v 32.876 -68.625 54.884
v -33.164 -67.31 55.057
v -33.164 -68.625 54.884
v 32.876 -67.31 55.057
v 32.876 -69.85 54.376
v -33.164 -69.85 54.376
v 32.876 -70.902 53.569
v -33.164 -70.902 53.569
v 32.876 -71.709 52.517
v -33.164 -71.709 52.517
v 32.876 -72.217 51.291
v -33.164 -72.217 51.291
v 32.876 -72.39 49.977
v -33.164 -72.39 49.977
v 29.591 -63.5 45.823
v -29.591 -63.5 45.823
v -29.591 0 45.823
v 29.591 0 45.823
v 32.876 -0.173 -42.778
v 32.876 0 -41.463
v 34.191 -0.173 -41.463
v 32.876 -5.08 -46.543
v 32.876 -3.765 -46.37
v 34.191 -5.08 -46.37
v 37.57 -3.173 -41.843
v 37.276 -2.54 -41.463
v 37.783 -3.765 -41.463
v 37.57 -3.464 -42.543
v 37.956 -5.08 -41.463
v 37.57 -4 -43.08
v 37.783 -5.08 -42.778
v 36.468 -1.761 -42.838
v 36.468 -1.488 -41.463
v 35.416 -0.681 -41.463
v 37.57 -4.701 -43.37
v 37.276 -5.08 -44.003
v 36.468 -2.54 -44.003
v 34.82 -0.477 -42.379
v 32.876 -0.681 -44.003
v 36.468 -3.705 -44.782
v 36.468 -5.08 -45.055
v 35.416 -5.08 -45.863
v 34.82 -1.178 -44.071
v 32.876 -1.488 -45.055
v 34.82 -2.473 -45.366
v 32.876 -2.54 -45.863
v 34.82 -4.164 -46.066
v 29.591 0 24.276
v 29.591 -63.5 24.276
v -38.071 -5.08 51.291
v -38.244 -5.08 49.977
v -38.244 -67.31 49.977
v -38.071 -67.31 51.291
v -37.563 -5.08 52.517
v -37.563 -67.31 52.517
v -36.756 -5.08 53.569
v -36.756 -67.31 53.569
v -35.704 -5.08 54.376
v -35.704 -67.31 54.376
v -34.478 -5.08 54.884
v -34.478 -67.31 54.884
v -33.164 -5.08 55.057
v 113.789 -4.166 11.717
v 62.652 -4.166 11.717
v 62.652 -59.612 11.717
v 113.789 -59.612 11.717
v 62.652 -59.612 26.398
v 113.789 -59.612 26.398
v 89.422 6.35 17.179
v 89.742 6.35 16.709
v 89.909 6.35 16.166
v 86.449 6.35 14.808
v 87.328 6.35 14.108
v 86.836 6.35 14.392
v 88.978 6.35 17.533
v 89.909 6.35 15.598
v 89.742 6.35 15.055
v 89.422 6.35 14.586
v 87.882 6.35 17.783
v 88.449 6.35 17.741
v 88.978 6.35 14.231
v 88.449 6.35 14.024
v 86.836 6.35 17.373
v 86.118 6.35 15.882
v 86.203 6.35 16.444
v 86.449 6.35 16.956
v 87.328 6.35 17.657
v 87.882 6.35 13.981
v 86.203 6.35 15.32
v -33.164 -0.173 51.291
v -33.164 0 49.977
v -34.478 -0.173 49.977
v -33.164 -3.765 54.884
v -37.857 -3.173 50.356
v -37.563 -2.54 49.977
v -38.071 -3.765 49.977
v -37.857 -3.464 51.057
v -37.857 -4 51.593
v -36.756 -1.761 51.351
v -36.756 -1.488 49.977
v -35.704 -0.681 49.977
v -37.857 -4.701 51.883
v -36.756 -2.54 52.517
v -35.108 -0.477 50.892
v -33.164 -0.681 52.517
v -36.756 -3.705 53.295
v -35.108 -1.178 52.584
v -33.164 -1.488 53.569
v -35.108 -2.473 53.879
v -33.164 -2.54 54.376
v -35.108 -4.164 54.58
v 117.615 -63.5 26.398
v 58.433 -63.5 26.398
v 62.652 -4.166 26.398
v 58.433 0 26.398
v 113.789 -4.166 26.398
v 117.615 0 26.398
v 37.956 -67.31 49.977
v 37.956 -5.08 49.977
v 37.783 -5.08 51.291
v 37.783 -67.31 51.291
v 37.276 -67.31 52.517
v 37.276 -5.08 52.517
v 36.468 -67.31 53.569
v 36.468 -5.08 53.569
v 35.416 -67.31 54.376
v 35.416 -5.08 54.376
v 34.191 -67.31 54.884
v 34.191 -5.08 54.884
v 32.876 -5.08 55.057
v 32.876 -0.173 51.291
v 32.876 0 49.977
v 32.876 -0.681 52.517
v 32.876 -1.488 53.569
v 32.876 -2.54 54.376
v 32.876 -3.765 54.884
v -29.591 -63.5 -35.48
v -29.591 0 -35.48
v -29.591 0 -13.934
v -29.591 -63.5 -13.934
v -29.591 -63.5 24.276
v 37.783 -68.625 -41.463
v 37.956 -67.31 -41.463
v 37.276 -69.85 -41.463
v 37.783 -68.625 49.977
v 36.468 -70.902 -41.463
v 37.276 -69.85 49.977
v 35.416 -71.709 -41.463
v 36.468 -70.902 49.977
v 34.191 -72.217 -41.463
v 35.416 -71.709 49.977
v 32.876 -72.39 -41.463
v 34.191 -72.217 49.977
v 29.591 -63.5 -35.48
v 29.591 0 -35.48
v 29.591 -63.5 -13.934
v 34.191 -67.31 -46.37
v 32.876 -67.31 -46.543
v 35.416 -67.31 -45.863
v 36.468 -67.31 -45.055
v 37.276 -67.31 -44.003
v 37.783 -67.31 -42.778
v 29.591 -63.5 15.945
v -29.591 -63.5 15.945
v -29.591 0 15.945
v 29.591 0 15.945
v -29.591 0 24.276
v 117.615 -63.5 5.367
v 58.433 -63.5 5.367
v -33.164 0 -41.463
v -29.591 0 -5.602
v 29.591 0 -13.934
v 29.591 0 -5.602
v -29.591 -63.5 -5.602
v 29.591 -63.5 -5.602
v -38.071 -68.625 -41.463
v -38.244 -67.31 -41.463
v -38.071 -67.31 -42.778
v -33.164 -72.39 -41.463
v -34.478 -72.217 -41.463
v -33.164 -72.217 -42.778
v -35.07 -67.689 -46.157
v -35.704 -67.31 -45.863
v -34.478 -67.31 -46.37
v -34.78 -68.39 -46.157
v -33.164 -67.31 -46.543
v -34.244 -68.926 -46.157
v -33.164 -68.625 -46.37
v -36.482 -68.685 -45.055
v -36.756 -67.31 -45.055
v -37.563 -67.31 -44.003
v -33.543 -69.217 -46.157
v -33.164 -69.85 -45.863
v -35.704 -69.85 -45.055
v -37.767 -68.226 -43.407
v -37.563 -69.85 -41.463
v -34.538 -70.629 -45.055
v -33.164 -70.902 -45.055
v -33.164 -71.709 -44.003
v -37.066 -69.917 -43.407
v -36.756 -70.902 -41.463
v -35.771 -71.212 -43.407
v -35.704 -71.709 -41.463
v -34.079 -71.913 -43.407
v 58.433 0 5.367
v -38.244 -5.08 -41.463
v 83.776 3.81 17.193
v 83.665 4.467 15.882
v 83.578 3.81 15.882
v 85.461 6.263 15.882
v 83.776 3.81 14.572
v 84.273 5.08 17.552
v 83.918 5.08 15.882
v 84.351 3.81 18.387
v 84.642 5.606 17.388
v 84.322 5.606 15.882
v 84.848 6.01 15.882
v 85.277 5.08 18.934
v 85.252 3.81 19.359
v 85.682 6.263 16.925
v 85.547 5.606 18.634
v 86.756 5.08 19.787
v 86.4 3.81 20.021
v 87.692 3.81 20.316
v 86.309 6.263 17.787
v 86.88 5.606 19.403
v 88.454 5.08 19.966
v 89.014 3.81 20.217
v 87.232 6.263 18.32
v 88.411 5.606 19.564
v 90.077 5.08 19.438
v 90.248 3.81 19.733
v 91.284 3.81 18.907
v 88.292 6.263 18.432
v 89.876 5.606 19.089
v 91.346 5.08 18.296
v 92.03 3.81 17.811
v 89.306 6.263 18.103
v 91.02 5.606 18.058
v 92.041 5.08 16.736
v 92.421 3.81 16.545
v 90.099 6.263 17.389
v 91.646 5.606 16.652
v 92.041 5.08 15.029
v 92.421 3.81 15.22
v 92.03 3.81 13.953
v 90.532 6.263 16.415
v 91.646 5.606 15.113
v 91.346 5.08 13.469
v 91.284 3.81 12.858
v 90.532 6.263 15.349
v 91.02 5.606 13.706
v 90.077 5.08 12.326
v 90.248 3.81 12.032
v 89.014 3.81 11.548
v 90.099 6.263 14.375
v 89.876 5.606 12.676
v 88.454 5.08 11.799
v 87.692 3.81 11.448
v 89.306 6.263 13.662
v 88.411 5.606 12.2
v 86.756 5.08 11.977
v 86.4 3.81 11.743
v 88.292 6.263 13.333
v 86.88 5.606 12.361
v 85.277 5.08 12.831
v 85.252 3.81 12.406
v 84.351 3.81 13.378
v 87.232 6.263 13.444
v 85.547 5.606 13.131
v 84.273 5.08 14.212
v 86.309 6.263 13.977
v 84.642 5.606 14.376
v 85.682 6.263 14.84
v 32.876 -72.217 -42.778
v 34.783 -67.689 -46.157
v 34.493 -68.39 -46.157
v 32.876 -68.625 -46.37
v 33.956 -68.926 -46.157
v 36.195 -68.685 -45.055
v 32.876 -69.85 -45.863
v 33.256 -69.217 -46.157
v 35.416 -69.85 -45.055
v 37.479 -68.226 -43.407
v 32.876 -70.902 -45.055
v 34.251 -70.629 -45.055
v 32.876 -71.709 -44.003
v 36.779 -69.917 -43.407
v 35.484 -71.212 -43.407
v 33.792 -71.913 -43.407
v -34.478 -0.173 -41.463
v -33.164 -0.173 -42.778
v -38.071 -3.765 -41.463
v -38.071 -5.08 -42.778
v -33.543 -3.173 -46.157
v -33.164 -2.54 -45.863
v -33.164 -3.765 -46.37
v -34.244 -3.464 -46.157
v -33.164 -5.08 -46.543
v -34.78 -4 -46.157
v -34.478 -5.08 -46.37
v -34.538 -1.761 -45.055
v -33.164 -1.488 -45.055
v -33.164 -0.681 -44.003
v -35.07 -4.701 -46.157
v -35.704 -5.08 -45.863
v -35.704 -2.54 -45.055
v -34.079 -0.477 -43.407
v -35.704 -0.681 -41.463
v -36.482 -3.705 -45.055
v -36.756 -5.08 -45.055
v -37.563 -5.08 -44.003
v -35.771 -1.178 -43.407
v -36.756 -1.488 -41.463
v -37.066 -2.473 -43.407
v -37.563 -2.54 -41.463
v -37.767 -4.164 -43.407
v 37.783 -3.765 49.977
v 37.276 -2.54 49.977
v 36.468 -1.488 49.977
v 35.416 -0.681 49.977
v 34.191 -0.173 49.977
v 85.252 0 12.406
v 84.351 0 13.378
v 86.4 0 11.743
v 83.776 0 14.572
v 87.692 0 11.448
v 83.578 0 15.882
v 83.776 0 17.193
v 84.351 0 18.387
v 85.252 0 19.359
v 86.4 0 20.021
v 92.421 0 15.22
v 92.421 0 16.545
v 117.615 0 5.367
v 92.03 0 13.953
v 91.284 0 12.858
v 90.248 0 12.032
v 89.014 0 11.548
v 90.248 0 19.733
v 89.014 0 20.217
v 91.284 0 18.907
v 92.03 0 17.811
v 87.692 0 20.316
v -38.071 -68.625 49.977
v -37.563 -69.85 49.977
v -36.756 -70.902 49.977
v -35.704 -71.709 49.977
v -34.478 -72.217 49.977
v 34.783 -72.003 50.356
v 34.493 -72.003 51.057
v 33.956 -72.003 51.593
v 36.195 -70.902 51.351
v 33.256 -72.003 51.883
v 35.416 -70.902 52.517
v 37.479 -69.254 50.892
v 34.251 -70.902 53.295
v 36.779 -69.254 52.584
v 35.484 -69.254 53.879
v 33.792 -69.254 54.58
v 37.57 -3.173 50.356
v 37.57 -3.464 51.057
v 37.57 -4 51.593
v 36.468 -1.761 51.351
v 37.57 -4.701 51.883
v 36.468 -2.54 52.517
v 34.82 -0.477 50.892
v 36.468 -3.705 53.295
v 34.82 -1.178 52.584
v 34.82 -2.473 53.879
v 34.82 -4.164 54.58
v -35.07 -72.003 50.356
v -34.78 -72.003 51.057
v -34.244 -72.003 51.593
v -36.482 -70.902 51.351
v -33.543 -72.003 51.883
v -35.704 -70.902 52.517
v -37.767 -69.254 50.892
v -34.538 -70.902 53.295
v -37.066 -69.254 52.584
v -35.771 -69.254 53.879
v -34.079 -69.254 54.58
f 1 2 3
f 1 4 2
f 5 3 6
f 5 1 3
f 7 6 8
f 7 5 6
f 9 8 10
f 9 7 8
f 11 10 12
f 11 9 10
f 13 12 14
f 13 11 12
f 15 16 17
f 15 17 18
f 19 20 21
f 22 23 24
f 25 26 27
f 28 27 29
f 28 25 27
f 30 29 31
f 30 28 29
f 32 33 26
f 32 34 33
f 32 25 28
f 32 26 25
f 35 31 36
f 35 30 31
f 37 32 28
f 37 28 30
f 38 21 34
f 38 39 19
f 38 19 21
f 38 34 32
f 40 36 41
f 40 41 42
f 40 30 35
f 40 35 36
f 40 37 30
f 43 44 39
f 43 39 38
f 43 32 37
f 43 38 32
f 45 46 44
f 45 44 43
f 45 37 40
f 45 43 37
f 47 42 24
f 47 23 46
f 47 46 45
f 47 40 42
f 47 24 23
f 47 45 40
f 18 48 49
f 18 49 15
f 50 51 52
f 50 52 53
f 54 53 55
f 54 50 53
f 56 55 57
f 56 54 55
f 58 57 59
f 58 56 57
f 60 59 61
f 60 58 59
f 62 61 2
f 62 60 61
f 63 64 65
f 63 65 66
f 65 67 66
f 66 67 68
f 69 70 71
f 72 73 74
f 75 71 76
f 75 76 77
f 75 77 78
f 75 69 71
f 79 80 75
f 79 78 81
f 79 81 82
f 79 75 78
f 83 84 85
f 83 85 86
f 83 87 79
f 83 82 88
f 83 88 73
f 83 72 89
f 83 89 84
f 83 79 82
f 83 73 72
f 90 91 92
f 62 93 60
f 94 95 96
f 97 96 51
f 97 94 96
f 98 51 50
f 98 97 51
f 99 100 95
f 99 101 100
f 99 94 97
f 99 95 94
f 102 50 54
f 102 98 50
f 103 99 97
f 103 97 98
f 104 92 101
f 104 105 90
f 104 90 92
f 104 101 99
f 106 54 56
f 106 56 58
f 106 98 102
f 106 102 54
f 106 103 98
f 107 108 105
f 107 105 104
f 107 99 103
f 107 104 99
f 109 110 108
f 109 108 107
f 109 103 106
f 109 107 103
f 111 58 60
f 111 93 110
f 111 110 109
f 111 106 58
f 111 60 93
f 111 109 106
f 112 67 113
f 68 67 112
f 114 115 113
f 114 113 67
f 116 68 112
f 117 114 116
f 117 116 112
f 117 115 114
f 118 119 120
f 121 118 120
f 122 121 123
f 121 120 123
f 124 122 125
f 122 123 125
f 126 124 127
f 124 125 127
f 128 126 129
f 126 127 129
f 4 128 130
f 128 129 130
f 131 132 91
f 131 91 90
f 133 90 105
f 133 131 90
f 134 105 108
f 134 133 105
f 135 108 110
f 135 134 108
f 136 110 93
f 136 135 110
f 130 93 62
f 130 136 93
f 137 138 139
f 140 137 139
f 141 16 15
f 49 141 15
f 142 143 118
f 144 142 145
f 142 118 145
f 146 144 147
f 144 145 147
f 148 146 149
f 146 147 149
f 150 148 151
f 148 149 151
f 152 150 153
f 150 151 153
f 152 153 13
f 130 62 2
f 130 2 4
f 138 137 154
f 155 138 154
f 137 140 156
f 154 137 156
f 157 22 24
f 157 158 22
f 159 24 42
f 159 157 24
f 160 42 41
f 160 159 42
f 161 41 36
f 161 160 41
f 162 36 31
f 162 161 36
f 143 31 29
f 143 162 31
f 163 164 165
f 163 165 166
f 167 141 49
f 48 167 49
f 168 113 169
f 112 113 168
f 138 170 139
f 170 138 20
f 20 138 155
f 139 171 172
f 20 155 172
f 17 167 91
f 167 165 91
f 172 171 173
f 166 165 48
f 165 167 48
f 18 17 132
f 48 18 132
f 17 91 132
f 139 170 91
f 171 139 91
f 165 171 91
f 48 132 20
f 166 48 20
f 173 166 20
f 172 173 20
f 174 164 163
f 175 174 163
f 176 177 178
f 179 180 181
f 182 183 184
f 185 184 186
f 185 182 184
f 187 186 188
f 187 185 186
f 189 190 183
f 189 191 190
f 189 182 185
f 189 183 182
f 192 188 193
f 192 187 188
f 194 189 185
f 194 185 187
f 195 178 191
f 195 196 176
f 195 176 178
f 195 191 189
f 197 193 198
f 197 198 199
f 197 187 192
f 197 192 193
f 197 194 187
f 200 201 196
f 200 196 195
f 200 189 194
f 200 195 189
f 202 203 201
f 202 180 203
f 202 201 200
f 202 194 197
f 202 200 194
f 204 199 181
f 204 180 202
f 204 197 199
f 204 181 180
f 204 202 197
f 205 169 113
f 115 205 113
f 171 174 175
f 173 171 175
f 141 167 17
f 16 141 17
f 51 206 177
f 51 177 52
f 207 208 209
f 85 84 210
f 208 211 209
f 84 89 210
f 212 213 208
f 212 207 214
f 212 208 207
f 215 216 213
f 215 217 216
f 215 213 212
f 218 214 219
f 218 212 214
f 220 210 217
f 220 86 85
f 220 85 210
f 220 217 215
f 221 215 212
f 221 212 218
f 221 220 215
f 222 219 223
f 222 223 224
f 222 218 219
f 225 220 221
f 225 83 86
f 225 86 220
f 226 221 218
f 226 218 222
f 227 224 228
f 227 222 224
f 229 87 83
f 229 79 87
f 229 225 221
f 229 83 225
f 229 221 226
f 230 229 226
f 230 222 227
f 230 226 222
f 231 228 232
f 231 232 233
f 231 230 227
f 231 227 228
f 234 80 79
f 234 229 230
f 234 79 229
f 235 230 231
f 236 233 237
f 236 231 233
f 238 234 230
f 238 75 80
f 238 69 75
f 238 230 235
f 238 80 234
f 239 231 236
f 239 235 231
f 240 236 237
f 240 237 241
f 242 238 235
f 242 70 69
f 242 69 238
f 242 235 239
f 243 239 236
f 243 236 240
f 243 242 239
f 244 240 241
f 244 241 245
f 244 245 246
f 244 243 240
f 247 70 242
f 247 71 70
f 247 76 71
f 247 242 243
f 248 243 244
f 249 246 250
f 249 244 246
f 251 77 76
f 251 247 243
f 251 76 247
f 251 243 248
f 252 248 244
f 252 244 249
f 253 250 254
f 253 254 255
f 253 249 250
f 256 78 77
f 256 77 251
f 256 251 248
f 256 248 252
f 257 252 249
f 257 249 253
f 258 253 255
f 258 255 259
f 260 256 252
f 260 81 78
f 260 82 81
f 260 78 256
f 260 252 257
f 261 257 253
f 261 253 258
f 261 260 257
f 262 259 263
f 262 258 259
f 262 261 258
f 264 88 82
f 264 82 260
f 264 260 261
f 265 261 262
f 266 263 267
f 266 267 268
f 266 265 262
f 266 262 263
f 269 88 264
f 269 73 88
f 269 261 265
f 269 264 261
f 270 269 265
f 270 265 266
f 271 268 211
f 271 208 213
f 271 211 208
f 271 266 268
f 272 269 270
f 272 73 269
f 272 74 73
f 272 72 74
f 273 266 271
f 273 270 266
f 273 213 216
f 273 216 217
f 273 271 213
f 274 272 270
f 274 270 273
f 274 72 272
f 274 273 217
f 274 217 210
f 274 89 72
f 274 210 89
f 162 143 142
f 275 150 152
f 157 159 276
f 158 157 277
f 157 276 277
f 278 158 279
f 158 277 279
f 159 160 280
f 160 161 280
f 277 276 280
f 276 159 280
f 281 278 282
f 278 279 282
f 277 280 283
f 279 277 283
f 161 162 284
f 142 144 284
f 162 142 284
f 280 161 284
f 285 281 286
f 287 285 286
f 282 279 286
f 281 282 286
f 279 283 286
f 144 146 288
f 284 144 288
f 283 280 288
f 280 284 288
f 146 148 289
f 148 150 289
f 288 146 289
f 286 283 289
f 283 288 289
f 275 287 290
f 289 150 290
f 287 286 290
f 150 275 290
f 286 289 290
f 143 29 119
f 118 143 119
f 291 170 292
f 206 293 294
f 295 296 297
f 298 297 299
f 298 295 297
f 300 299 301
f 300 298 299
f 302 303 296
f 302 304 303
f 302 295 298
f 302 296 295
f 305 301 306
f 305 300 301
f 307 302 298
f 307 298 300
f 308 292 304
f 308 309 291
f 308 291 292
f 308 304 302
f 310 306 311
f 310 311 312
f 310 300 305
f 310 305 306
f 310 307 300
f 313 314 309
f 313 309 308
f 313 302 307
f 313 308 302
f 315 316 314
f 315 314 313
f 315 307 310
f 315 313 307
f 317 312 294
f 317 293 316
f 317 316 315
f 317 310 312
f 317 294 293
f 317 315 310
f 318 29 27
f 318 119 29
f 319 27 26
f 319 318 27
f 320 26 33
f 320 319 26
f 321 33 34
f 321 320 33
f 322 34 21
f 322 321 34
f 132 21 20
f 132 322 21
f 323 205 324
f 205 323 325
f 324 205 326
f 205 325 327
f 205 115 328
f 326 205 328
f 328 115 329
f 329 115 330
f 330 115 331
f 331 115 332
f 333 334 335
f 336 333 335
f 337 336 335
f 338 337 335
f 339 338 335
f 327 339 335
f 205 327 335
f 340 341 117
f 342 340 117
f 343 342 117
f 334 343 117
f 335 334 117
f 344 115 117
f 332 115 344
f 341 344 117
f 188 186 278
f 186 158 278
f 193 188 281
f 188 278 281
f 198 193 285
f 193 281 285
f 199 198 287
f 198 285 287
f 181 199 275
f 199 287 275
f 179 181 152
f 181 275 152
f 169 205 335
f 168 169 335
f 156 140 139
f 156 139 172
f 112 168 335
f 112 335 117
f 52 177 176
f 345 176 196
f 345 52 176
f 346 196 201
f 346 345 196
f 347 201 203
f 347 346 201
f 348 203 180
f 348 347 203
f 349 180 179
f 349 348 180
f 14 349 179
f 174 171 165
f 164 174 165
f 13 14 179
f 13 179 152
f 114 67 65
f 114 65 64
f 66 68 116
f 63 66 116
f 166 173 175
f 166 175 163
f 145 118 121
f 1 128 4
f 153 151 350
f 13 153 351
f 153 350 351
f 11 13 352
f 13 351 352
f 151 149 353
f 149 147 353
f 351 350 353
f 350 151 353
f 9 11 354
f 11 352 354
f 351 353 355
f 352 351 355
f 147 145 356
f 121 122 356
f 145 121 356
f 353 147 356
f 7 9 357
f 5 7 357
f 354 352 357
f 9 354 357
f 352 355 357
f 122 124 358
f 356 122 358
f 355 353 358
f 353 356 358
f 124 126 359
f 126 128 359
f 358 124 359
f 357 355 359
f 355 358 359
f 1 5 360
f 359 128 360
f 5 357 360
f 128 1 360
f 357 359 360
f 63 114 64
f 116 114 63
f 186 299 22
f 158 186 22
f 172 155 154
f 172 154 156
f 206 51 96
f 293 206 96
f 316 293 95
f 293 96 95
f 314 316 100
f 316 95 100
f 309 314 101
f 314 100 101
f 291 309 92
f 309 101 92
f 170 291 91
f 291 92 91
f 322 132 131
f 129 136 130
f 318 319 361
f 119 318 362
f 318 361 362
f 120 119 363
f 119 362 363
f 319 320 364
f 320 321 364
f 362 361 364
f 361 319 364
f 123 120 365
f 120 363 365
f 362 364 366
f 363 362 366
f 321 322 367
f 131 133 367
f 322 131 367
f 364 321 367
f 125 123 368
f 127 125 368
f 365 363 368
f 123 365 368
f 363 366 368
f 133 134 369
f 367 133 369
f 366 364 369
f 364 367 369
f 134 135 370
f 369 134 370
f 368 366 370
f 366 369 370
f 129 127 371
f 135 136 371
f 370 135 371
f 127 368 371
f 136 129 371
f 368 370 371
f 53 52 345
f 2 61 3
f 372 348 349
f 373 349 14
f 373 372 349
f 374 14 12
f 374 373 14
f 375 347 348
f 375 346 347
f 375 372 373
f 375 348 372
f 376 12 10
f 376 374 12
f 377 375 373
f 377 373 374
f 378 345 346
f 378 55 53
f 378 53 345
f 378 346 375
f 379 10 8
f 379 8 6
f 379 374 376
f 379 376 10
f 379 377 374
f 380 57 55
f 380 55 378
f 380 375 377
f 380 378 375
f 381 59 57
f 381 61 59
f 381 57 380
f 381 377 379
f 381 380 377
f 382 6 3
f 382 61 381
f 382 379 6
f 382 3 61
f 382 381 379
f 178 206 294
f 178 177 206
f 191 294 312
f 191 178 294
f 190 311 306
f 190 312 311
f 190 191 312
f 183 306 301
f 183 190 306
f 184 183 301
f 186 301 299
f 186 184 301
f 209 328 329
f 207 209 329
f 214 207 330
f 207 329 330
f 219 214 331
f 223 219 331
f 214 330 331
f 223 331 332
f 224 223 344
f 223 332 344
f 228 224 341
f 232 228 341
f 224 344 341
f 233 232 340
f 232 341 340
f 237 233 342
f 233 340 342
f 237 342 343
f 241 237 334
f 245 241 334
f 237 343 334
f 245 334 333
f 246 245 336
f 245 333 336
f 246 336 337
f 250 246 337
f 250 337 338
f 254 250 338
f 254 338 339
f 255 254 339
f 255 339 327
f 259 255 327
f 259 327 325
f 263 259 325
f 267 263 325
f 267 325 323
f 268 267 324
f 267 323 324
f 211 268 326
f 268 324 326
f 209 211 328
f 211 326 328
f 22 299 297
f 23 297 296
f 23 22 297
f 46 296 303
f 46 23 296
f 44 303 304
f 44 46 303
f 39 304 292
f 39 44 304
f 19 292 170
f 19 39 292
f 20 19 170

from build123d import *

# Parameters (mm, degrees)
F0_W      = 76.2
F0_H      = 101.6
F0_W_2    = 59.1815430671
F0_H_2    = 21.5466786176
F0_H_3    = 21.5466790833
F0_H_4    = 21.546676755
F1_DEPTH  = 63.5
F2_W      = 76.2
F2_H      = 101.6
F3_DEPTH  = 8.89
F4_W      = 59.182
F4_H      = 21.0312
F5_DEPTH  = 63.5
F6_T      = -6.35
F7_W      = 51.1374548078
F7_H      = 55.4467877373
F8_DEPTH  = 14.6812
F9_R      = 4.4462693539
F10_DEPTH = 6.35
F11_R     = 2.54
F12_R     = 5.08


with BuildPart() as f1:
    # F0 (on Front) → F1 (new body)
    with BuildSketch(Plane.XZ):
        with Locations((-0.1436434686, 4.2566598623)):
            Rectangle(F0_W, F0_H)
        with Locations((-9.313e-07, -24.7068582103)):
            Rectangle(F0_W_2, F0_H_2, mode=Mode.SUBTRACT)
        with Locations((-9.313e-07, 5.1712028217)):
            Rectangle(F0_W_2, F0_H_3, mode=Mode.SUBTRACT)
        with Locations((-9.313e-07, 35.0492633879)):
            Rectangle(F0_W_2, F0_H_4, mode=Mode.SUBTRACT)
    extrude(amount=F1_DEPTH)

    # F2 (on face) → F3 (join)
    with BuildSketch(Plane.XZ.offset(63.5)):
        with Locations((-0.1436434686, 4.2566598623)):
            Rectangle(F2_W, F2_H)
    extrude(amount=F3_DEPTH)

    # F12
    f12_edges = [f1.edges().sort_by_distance(p)[0] for p in [
        (-0.143643, 0, 55.05666),
        (-38.243643, 0, 4.25666),
        (-0.143643, 0, -46.54334),
        (37.956357, 0, 4.25666),
        (-38.243643, -36.195, 55.05666),
        (-38.243643, -72.39, 4.25666),
        (-38.243643, -36.195, -46.54334),
        (37.956357, -36.195, 55.05666),
        (37.956357, -72.39, 4.25666),
        (37.956357, -36.195, -46.54334),
        (-0.143643, -72.39, 55.05666),
        (-0.143643, -72.39, -46.54334),
    ]]
    fillet(f12_edges, radius=F12_R)


with BuildPart() as f5:
    # F4 (on Front) → F5 (new body)
    with BuildSketch(Plane.XZ):
        with Locations((88.024456054, 15.882300658)):
            Rectangle(F4_W, F4_H)
    extrude(amount=F5_DEPTH)

    # F6 (hollow: no face is removed)
    offset(amount=F6_T, mode=Mode.SUBTRACT)

    # F7 (on face) → F8 (cut)
    with BuildSketch(Plane.XY.offset(26.397900658)):
        with Locations((88.2206596434, -31.8890851922)):
            Rectangle(F7_W, F7_H)
    extrude(amount=-F8_DEPTH, mode=Mode.SUBTRACT)

    # F9 (on face) → F10 (join)
    with BuildSketch(Plane(origin=(0, 0, 0), x_dir=(-1, 0, 0), z_dir=(0, 1, 0))):
        with Locations((-88.024456054, 15.882300658)):
            Circle(F9_R)
    extrude(amount=F10_DEPTH)

    # F11
    f11_edges = [f5.edges().sort_by_distance(p)[0] for p in [
        (92.470725, 6.35, 15.882301),
    ]]
    fillet(f11_edges, radius=F11_R)


solid = Compound([f1.part, f5.part])
